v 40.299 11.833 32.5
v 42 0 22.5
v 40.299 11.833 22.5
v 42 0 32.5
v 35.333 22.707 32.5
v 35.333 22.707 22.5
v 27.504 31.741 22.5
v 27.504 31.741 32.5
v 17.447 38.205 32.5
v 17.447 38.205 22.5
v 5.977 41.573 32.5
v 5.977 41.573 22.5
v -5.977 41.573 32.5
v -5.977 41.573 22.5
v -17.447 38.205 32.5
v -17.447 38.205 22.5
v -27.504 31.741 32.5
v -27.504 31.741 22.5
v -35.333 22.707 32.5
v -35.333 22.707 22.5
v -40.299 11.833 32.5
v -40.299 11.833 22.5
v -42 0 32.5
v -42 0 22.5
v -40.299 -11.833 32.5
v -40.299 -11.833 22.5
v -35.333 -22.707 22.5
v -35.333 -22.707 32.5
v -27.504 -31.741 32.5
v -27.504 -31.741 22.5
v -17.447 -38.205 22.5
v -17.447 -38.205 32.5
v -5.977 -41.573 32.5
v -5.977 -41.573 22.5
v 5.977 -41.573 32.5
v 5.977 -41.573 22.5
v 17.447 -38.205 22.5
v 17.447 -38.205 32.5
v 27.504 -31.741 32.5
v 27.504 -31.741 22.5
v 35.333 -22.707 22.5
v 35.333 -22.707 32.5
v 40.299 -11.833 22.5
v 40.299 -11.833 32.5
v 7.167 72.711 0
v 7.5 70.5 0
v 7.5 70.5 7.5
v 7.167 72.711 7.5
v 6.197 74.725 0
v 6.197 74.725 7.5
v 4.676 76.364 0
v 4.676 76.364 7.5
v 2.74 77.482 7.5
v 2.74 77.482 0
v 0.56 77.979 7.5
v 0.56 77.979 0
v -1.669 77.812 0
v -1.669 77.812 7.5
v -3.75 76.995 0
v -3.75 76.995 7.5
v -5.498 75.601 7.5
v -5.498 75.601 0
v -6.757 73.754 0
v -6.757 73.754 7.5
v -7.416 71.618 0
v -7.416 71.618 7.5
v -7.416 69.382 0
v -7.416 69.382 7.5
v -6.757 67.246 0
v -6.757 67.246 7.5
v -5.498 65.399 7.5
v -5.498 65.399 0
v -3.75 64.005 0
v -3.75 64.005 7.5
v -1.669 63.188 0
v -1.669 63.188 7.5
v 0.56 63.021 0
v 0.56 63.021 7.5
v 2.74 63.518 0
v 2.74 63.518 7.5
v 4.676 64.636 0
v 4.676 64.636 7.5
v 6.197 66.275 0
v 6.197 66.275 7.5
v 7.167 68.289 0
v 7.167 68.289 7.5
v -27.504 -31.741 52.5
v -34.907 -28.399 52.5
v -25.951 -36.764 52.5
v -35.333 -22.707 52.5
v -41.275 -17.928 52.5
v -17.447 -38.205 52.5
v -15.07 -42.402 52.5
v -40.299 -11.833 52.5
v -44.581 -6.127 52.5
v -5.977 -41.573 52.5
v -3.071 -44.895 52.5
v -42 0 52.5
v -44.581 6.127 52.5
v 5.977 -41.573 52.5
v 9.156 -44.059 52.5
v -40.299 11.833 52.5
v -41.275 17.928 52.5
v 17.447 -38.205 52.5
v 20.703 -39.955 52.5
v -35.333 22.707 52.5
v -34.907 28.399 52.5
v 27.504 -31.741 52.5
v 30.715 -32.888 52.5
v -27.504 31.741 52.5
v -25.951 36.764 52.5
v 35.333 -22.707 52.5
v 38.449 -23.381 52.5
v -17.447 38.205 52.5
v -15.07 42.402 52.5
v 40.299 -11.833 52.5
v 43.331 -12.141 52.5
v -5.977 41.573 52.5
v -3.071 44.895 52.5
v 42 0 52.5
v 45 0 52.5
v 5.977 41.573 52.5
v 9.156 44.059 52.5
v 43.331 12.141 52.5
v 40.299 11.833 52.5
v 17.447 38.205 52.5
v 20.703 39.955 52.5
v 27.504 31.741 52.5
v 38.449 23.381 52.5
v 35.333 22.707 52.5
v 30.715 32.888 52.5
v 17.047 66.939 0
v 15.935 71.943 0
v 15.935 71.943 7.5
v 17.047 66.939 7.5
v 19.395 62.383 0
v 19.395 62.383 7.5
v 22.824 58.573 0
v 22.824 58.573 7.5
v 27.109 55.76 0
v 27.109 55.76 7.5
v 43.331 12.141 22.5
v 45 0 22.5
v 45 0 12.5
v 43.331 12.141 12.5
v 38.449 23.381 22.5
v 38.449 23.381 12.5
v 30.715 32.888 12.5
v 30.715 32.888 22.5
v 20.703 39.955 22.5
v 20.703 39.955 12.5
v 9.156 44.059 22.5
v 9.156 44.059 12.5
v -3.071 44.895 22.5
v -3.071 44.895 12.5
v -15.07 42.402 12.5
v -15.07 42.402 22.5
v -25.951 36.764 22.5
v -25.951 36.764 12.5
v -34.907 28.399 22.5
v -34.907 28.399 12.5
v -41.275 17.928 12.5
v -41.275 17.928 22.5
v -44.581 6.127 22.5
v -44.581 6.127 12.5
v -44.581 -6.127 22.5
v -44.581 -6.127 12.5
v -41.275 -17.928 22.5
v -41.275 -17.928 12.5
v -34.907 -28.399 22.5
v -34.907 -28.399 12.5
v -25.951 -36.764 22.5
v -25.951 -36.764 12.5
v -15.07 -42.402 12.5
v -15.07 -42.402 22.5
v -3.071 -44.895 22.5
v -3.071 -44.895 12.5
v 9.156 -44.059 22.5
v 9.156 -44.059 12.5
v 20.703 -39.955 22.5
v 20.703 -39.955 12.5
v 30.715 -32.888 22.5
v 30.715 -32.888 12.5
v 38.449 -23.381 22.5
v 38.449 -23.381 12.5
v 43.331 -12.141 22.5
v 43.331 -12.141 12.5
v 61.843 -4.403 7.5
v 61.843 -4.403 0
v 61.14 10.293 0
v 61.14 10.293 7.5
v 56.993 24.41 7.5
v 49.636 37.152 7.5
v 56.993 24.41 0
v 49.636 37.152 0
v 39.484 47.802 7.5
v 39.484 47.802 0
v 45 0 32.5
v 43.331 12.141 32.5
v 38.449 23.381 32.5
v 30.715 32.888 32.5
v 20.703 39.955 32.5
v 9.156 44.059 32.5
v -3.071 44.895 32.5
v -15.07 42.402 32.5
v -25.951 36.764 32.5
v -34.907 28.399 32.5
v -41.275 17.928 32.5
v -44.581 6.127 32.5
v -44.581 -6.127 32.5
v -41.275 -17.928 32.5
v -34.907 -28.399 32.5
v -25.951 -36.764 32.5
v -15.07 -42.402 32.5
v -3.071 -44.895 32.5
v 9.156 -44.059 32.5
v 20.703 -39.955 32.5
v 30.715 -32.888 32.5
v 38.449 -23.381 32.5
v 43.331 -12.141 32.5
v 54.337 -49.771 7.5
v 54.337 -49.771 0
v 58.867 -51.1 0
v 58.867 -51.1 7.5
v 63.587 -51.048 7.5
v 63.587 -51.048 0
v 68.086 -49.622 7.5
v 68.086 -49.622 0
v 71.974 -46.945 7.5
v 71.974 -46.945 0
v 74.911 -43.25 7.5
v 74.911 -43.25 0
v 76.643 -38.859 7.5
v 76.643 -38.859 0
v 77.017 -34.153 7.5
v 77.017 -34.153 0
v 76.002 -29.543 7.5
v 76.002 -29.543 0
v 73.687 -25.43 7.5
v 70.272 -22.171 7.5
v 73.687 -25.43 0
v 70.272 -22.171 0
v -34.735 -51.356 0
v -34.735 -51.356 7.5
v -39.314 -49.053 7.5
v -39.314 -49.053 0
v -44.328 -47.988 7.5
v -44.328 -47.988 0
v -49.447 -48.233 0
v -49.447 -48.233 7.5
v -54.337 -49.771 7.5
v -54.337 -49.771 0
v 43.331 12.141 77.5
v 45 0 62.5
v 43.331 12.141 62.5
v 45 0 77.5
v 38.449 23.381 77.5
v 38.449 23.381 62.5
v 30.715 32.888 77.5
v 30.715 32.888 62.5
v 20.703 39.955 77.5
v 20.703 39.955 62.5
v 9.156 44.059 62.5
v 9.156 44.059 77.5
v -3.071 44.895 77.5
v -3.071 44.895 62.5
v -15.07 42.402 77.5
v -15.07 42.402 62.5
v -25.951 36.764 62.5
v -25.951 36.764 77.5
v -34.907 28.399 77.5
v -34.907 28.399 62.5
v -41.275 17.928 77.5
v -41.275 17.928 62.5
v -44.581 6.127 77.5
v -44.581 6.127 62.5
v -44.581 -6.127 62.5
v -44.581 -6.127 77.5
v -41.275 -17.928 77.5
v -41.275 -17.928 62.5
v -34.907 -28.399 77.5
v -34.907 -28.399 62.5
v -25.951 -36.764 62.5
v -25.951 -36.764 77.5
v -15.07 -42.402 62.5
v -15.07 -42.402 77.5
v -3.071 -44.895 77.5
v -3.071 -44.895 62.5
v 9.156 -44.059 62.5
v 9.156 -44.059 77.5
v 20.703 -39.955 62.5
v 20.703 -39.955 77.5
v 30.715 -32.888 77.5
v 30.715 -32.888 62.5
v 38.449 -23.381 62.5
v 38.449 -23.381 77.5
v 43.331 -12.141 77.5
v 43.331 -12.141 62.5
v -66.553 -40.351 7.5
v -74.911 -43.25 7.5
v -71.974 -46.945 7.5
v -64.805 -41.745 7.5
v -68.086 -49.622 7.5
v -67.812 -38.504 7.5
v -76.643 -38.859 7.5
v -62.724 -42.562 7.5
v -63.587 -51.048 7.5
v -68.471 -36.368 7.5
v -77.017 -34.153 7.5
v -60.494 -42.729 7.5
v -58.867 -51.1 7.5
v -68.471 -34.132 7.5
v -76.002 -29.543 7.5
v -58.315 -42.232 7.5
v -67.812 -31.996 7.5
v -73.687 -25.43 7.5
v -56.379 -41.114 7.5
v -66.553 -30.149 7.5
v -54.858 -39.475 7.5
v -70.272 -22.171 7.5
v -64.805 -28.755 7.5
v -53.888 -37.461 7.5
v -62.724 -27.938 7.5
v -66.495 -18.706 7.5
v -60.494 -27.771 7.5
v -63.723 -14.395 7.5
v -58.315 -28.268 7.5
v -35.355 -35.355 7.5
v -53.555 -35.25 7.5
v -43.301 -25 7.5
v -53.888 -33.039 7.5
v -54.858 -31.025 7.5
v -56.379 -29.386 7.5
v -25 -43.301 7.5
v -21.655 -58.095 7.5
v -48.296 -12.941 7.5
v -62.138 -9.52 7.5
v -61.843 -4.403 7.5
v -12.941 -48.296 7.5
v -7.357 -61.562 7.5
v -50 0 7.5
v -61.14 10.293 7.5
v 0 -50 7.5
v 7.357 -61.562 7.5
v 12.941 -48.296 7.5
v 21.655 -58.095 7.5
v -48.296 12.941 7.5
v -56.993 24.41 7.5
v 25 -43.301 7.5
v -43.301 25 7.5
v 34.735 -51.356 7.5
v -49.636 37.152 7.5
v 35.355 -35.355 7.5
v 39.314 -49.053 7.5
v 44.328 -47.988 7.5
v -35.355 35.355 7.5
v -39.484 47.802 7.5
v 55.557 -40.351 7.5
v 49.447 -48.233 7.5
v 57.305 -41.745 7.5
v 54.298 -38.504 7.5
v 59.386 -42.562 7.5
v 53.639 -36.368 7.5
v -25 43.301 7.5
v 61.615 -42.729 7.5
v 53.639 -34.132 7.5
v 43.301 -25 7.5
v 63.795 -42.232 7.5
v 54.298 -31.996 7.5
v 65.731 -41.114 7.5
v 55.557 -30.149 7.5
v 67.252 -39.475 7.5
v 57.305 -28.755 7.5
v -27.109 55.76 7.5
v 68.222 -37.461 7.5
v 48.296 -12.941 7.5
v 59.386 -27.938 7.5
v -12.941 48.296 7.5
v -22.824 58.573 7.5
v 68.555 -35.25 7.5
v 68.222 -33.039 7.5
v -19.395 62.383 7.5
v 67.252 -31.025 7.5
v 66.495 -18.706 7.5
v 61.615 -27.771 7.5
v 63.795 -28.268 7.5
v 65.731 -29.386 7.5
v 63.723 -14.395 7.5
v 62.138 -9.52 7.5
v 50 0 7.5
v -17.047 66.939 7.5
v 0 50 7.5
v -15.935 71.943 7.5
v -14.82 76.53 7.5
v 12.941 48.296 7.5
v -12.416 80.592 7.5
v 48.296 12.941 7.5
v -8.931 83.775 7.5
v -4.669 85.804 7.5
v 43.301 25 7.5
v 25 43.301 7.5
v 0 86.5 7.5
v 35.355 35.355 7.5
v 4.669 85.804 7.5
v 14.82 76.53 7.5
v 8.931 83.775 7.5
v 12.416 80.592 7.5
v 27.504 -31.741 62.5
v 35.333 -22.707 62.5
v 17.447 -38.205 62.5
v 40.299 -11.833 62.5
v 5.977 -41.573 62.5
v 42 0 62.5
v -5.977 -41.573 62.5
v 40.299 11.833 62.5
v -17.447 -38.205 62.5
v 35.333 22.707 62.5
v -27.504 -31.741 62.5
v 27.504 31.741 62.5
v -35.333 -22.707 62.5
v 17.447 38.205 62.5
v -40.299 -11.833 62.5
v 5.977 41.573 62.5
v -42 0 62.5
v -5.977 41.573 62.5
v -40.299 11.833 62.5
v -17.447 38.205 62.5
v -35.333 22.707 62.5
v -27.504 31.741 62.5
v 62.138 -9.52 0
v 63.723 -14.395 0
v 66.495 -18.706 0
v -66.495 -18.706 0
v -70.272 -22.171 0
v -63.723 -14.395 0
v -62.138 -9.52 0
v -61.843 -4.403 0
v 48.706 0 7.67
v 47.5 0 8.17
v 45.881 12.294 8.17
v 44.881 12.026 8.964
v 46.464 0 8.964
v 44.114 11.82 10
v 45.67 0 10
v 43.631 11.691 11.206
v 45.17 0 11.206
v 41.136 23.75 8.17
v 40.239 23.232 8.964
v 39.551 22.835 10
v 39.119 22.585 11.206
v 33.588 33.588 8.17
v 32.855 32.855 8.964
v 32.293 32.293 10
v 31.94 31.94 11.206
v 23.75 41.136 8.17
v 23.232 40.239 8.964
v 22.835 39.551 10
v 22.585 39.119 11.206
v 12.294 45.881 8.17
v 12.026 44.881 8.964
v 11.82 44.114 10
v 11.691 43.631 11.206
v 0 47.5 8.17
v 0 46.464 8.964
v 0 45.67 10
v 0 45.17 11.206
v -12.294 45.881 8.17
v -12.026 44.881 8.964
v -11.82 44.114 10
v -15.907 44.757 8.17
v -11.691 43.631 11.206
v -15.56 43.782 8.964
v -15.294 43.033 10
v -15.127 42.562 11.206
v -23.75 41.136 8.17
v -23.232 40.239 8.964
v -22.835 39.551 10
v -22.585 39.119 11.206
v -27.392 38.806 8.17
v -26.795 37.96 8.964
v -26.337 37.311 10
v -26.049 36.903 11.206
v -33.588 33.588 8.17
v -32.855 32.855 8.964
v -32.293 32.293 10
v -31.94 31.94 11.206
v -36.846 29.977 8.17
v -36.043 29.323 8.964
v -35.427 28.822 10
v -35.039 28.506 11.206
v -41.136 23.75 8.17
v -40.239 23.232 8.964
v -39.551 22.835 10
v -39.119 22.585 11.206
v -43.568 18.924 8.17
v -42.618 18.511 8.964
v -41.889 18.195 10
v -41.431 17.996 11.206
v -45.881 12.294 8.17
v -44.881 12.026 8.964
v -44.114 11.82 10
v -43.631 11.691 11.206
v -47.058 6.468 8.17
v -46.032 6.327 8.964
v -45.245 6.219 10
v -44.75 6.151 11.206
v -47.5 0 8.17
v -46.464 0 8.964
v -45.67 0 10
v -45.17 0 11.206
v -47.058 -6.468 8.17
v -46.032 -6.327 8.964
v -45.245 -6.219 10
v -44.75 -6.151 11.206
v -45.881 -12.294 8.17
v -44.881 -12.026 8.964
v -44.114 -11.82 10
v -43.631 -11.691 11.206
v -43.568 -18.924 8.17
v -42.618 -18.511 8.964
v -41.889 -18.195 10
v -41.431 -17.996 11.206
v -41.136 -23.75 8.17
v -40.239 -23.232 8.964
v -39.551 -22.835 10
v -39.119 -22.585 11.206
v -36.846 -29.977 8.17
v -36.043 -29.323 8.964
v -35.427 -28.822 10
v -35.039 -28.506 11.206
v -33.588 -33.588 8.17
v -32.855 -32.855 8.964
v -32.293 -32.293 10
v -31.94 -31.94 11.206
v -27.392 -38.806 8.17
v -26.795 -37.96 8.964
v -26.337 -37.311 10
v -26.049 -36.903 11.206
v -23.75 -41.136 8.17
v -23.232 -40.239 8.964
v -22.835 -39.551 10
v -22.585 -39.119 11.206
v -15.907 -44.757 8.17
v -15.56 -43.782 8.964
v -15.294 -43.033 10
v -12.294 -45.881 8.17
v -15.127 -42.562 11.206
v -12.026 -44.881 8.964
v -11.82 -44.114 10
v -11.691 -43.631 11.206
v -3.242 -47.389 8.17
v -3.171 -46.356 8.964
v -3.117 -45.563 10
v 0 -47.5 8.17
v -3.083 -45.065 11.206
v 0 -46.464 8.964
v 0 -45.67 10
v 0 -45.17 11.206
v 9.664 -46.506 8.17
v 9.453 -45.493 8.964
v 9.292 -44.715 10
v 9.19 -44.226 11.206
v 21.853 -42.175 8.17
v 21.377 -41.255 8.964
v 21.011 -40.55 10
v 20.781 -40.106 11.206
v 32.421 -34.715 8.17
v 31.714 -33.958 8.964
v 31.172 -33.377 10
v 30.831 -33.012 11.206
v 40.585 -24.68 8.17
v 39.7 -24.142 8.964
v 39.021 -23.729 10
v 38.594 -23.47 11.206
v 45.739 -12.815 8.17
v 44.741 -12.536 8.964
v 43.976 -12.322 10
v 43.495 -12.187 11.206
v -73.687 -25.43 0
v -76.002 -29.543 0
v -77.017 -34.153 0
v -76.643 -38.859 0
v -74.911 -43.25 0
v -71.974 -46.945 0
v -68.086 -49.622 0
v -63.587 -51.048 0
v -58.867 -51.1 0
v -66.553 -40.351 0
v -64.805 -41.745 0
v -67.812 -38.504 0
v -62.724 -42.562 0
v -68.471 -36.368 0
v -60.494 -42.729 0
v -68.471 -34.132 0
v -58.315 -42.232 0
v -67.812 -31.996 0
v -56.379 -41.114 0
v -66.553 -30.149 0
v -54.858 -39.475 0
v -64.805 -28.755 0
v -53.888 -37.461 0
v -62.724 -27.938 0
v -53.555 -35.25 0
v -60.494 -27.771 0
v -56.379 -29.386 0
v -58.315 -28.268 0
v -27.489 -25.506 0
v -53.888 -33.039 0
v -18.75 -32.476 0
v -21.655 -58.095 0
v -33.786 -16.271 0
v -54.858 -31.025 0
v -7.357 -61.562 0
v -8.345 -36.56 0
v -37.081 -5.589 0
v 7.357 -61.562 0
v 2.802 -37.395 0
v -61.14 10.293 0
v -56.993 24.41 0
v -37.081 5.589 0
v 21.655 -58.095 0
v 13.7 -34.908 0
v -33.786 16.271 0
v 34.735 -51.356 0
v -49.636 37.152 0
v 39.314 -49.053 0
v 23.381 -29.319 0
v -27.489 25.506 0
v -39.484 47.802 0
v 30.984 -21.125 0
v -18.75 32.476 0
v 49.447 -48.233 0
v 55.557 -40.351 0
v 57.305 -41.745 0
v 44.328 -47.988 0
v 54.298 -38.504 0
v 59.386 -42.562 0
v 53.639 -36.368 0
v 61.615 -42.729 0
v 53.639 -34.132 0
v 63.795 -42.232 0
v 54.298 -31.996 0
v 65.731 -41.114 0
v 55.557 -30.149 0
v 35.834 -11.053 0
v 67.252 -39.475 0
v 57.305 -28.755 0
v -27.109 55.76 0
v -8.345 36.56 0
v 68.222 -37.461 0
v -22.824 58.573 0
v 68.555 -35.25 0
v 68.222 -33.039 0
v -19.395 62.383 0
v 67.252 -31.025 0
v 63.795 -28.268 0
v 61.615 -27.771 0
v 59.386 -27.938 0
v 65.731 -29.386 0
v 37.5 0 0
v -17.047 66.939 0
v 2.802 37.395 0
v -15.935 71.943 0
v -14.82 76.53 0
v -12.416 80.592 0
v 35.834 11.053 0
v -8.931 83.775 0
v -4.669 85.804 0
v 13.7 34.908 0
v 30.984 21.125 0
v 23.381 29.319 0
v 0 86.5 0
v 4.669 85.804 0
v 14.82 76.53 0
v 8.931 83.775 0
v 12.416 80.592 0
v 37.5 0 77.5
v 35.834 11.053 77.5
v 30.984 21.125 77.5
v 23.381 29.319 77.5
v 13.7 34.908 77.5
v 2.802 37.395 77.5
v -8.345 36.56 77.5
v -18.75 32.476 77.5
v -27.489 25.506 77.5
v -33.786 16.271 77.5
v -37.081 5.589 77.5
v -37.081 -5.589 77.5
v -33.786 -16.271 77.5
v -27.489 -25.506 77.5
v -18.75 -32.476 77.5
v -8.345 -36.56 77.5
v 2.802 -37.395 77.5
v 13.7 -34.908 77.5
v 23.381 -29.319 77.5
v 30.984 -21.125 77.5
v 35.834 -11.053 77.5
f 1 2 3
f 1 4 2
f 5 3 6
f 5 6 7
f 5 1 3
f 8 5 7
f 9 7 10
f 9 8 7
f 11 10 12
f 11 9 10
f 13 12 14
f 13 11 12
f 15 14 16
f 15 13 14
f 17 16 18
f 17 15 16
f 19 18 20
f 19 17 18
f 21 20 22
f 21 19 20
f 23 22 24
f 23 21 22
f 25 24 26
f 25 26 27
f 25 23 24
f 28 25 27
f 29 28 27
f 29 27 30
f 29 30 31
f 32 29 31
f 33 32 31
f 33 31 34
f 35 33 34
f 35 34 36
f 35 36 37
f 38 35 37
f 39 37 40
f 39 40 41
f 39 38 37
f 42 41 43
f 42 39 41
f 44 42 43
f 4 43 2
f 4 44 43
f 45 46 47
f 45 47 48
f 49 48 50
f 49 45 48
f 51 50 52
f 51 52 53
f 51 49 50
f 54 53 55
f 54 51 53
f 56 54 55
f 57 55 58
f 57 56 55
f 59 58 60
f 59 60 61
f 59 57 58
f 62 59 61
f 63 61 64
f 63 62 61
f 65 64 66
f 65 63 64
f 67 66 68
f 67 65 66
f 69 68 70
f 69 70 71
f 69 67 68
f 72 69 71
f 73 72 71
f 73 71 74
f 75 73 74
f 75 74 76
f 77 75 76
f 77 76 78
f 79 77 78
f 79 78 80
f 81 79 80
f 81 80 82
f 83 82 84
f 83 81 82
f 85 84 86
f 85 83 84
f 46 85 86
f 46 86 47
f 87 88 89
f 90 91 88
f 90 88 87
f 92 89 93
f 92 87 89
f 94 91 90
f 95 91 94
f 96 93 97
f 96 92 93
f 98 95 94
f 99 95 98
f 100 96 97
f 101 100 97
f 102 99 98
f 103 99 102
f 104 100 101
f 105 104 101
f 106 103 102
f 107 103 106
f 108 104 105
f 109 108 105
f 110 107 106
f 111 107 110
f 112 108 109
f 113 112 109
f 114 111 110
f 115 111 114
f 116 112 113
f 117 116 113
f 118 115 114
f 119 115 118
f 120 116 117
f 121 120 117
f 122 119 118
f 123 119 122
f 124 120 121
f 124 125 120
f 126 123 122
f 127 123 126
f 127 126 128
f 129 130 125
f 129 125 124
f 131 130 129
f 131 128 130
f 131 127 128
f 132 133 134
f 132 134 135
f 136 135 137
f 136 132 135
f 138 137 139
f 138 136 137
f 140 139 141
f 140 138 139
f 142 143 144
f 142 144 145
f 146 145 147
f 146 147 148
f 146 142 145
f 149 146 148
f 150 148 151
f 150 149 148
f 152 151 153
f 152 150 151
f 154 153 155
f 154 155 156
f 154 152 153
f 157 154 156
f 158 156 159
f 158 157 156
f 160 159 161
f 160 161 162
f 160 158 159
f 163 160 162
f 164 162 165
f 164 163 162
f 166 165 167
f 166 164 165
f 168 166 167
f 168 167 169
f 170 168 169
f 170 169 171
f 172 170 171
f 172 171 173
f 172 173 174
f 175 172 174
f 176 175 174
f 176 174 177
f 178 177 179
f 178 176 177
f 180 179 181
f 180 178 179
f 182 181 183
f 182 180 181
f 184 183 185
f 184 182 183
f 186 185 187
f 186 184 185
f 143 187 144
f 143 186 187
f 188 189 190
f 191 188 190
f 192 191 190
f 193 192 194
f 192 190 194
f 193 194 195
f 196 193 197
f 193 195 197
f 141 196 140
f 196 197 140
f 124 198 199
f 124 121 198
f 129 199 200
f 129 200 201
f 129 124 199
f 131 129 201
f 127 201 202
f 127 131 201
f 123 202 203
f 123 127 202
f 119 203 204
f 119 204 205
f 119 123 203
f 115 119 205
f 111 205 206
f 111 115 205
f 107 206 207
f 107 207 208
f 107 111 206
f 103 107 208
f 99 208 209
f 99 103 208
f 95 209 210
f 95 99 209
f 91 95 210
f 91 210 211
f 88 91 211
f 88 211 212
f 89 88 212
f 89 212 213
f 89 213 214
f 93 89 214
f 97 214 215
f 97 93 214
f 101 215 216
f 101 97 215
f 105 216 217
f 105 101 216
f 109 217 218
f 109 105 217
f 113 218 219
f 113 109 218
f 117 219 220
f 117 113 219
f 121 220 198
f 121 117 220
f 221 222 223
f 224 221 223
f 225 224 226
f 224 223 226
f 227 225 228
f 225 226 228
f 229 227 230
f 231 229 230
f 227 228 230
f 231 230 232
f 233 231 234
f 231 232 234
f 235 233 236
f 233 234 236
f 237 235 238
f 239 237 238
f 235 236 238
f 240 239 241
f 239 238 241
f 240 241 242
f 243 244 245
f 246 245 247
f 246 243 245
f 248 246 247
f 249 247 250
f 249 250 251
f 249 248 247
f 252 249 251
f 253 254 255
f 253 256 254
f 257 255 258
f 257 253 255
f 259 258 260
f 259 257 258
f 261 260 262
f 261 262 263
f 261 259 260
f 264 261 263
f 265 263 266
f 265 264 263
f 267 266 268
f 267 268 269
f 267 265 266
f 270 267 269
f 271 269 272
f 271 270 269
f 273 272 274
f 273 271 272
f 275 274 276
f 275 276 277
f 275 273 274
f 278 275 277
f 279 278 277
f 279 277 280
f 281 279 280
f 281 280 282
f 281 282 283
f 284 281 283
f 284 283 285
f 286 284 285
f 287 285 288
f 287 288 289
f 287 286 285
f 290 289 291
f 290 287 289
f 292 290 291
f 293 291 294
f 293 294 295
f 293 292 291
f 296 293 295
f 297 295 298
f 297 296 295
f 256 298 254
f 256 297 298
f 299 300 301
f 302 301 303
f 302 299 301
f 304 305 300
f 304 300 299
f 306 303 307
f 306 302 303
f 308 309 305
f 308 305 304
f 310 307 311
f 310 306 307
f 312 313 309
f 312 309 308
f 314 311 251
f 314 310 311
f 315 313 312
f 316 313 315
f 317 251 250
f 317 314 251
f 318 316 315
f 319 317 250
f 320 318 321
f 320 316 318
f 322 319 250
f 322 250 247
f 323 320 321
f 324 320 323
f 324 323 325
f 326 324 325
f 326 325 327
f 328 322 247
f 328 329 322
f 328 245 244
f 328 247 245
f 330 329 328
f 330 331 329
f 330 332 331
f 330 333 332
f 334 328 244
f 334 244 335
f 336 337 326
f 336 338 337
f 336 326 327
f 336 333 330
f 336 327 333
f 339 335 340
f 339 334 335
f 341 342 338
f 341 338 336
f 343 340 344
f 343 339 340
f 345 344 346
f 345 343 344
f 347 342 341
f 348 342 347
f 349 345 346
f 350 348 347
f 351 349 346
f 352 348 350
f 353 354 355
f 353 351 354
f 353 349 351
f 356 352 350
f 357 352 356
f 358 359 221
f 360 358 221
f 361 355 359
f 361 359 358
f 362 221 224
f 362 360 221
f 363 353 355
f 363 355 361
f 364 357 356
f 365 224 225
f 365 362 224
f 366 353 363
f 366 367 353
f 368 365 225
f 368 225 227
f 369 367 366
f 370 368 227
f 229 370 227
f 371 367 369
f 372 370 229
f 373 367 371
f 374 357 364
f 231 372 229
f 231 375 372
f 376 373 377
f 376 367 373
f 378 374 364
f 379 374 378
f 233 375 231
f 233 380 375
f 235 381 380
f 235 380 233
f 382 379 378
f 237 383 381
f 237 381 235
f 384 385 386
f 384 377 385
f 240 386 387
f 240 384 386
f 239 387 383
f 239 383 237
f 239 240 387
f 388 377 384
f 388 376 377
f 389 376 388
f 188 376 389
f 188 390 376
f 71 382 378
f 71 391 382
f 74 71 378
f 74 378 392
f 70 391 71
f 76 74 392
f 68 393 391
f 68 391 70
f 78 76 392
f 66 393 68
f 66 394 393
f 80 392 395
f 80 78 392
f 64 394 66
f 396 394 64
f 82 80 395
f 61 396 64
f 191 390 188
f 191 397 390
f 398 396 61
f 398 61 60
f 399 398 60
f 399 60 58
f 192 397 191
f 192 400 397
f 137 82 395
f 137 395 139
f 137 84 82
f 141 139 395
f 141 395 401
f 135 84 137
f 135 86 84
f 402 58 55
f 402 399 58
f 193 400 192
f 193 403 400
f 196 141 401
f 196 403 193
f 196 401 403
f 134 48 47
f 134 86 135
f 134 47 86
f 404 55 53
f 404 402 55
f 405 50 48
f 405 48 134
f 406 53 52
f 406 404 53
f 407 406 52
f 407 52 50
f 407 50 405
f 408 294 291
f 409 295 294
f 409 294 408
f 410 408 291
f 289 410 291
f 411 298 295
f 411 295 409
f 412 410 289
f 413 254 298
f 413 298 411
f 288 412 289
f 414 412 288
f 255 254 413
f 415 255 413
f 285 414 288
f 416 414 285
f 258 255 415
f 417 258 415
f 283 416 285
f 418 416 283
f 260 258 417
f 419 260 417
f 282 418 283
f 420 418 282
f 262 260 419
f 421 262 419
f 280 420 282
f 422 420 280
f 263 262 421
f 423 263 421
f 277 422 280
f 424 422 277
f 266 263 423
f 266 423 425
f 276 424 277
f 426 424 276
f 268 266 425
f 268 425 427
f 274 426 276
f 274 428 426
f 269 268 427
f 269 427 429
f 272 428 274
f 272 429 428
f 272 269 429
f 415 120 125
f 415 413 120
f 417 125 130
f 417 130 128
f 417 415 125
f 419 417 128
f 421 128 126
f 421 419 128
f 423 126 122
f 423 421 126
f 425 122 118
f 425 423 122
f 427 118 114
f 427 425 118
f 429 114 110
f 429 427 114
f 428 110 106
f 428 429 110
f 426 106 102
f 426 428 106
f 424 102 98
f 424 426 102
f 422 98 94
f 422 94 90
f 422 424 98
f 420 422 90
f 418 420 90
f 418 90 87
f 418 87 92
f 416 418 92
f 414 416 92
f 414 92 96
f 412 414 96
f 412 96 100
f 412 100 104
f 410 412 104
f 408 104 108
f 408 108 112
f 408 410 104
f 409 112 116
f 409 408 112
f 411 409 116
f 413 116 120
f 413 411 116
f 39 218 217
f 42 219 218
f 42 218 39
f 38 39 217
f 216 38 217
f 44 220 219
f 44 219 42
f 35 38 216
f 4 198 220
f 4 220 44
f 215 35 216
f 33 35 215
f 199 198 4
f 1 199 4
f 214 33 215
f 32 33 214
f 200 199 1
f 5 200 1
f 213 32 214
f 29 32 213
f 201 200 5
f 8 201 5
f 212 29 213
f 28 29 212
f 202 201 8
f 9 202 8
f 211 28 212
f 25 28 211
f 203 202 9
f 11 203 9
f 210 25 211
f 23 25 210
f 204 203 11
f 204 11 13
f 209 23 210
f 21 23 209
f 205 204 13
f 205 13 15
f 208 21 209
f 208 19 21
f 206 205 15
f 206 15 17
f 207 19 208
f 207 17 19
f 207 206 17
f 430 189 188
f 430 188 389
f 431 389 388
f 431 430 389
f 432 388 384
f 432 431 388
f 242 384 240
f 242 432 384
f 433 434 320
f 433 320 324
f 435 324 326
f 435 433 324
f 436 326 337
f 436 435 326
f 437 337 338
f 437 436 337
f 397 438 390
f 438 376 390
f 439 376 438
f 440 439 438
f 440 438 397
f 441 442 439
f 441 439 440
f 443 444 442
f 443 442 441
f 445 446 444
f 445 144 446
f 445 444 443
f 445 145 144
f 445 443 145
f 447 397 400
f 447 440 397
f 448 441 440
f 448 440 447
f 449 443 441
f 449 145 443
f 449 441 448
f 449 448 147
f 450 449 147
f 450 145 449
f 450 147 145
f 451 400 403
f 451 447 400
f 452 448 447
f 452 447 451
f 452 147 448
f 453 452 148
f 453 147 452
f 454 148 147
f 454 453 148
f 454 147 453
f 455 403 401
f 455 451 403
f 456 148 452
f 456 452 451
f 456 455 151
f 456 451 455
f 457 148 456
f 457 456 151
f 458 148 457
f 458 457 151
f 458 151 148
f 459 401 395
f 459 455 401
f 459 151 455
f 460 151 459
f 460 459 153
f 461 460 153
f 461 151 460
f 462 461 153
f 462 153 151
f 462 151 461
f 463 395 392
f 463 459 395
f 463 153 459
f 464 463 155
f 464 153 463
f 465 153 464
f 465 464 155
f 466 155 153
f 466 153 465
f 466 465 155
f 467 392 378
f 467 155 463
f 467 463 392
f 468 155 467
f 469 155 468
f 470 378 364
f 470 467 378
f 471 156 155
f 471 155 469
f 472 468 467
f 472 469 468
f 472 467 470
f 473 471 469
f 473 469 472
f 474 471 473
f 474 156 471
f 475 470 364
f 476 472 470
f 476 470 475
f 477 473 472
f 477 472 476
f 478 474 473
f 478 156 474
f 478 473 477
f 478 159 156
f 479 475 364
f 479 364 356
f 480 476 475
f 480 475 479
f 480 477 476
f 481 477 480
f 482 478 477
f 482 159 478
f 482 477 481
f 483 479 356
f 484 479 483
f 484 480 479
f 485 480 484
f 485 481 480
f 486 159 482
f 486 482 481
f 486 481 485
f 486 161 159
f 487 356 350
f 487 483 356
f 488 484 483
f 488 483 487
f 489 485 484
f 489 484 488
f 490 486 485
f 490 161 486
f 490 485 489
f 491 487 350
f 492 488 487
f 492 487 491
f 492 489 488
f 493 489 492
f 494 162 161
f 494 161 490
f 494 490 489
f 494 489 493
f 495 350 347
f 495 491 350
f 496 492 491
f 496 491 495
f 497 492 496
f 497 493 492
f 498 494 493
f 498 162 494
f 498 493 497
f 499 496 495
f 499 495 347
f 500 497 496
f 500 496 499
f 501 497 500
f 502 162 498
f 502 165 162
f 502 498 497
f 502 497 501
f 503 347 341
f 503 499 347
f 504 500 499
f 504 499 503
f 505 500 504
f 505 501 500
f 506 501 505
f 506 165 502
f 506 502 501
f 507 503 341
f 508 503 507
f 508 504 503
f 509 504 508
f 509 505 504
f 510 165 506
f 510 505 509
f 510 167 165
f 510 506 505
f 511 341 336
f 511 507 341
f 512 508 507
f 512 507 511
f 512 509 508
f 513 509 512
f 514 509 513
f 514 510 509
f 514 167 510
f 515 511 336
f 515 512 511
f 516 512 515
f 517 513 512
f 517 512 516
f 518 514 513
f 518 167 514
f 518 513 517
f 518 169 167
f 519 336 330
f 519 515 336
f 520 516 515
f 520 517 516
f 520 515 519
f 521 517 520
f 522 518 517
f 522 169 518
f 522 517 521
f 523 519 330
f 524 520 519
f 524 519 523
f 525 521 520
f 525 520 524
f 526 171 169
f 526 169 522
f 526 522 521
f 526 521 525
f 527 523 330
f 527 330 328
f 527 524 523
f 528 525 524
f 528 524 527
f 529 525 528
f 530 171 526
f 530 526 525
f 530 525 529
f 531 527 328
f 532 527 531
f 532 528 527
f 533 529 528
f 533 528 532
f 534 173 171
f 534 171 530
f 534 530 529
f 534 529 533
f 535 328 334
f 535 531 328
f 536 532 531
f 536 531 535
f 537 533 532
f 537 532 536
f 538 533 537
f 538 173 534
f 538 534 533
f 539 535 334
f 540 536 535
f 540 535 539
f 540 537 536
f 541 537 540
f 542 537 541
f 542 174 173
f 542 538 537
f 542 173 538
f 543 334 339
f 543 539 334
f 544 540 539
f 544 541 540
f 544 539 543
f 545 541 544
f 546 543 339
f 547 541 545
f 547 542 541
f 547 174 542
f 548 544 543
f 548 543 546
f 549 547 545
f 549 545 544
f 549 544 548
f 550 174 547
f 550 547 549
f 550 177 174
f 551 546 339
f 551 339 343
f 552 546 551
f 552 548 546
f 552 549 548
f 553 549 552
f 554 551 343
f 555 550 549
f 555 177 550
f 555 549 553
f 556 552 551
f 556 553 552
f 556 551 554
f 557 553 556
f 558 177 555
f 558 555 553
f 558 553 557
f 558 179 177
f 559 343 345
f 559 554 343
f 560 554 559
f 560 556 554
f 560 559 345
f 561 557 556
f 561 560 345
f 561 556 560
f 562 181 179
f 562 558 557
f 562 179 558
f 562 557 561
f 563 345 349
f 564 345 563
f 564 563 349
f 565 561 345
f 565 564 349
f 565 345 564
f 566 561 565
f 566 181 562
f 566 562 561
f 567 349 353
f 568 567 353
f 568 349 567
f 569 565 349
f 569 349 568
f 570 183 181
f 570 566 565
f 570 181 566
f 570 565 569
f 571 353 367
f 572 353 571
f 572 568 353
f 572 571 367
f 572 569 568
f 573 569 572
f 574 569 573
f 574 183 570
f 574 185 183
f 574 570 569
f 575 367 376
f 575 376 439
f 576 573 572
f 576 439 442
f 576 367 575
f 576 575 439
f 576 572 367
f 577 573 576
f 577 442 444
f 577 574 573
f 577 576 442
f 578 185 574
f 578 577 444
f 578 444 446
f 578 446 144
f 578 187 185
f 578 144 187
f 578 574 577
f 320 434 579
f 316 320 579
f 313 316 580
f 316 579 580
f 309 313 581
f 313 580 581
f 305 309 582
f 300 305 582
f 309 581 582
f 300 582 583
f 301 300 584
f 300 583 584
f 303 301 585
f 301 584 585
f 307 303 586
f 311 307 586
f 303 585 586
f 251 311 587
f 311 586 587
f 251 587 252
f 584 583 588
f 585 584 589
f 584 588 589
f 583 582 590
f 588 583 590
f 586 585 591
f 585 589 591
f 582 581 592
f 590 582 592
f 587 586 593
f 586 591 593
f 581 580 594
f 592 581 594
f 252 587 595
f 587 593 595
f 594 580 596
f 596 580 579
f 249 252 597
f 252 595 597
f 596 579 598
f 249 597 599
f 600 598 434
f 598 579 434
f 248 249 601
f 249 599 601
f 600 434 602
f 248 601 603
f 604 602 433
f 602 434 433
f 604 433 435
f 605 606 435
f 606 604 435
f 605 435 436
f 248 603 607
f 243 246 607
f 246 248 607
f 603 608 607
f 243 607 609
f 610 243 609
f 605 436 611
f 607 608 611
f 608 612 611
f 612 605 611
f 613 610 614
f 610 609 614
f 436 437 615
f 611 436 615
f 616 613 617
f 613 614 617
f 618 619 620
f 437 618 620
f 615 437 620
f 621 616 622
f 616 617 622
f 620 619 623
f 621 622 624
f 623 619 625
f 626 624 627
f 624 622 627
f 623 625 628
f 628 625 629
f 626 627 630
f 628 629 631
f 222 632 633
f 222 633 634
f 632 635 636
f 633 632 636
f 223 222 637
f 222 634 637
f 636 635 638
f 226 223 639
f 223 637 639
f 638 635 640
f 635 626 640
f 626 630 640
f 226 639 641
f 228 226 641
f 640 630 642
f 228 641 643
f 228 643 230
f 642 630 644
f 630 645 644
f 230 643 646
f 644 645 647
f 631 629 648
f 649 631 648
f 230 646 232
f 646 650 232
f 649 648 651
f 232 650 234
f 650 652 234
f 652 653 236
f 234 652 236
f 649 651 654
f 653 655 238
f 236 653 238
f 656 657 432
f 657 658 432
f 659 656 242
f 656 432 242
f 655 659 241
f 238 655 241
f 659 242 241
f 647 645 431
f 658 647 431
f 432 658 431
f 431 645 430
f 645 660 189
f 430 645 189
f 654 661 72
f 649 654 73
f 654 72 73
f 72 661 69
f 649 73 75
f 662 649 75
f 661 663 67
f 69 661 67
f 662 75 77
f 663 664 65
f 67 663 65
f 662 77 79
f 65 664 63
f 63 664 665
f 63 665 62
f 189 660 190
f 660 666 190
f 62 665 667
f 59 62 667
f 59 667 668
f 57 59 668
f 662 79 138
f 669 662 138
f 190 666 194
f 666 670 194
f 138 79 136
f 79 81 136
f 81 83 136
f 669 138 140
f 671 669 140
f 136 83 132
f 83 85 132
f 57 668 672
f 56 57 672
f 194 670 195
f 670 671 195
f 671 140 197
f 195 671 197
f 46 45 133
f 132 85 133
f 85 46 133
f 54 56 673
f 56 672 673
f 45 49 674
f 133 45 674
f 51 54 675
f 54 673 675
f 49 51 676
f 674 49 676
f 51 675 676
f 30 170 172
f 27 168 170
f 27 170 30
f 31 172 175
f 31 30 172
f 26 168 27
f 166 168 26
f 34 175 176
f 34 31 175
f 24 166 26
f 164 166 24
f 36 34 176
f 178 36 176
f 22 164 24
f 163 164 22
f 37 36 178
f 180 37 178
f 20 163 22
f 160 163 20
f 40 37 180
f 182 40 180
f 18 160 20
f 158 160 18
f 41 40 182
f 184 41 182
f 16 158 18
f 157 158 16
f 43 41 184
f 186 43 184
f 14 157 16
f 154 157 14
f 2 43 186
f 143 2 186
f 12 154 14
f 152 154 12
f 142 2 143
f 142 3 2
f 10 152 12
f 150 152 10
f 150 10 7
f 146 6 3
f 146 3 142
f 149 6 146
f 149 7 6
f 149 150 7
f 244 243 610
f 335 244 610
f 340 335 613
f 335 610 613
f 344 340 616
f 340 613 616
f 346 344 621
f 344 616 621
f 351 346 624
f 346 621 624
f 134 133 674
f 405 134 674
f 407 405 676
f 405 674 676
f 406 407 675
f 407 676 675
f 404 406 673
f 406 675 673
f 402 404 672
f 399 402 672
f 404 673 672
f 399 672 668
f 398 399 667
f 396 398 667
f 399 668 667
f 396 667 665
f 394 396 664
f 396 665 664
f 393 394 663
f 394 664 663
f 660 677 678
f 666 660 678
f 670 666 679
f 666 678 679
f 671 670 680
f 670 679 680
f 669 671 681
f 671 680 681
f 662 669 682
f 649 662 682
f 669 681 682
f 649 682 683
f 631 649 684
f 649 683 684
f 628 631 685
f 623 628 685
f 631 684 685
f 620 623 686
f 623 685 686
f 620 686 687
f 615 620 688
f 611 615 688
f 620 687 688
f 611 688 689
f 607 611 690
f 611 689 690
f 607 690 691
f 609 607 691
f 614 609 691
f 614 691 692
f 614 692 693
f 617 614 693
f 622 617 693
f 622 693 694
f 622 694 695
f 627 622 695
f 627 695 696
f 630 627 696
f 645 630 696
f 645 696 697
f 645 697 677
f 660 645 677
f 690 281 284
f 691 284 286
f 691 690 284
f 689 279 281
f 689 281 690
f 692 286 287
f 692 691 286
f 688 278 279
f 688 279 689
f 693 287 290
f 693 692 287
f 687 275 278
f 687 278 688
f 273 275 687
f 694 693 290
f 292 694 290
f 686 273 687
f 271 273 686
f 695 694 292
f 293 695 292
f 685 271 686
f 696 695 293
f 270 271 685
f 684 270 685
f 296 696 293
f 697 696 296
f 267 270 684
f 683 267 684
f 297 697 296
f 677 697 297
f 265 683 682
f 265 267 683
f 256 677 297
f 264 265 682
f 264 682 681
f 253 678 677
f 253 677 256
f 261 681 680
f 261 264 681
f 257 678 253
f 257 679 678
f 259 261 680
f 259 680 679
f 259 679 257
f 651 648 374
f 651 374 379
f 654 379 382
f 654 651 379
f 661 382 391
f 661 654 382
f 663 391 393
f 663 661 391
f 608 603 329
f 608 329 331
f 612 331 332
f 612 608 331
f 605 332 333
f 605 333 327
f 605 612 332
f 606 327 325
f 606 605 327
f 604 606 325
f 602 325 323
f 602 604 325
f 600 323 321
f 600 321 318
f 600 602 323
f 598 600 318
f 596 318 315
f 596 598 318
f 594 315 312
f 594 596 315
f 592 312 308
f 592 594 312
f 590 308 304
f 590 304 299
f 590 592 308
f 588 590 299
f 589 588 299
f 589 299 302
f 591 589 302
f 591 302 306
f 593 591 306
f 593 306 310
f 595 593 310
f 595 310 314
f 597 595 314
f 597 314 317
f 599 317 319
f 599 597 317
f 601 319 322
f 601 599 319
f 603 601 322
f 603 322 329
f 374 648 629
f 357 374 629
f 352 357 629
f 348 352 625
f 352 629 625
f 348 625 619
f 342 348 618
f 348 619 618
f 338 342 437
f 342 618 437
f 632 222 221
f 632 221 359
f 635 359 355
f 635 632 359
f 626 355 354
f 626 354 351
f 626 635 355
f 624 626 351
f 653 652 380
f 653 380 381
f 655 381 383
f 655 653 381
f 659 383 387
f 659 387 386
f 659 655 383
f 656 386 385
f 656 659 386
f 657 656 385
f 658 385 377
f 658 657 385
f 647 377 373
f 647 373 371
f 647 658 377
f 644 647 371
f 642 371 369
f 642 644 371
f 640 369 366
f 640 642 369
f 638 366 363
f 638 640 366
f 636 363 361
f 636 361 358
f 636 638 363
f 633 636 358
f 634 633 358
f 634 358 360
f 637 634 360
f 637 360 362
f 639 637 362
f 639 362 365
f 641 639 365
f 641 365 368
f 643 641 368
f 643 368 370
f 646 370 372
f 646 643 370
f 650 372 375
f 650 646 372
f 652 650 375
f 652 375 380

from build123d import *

# Parameters (mm, degrees)
SKETCH_R     = 7.5
PAD_DEPTH    = 7.5
FILLET_R     = 5
SKETCH002_R  = 37.5
POCKET_DEPTH = 77.501


with BuildPart() as part:
    # Sketch → Pad (new body)
    with BuildSketch(Plane.XY):
        with BuildLine():
            ThreePointArc((-27.108608, 55.759514), (-53.693575, 31), (-61.843459, -4.403014))
            ThreePointArc((-70.271756, -22.171485), (-63.722793, -14.394746), (-61.843459, -4.403014))
            ThreePointArc((-70.271756, -22.171485), (-74.911197, -43.25), (-54.336947, -49.771383))
            ThreePointArc((-34.734852, -51.3565), (-44.327612, -47.988185), (-54.336947, -49.771383))
            ThreePointArc((-34.734852, -51.3565), (0, -62), (34.734852, -51.3565))
            ThreePointArc((54.336947, -49.771383), (44.327612, -47.988185), (34.734852, -51.3565))
            ThreePointArc((54.336947, -49.771383), (74.911197, -43.25), (70.271756, -22.171485))
            ThreePointArc((61.843459, -4.403014), (63.722793, -14.394746), (70.271756, -22.171485))
            ThreePointArc((61.843459, -4.403014), (53.693575, 31), (27.108608, 55.759514))
            ThreePointArc((15.934809, 71.942868), (19.395181, 62.38293), (27.108608, 55.759514))
            ThreePointArc((15.934809, 71.942868), (0, 86.5), (-15.934809, 71.942868))
            ThreePointArc((-27.108608, 55.759514), (-19.395181, 62.38293), (-15.934809, 71.942868))
        make_face()
        with Locations((0, 70.5)):
            Circle(SKETCH_R, mode=Mode.SUBTRACT)
        with Locations((-61.054791, -35.25)):
            Circle(SKETCH_R, mode=Mode.SUBTRACT)
        with Locations((61.054791, -35.25)):
            Circle(SKETCH_R, mode=Mode.SUBTRACT)
    extrude(amount=PAD_DEPTH)

    # Sketch001 → Revolution (revolve)
    with BuildSketch(Plane.XZ):
        Polygon((0, 7.5), (45, 7.5), (45, 22.5), (42, 22.5), (42, 32.5), (45, 32.5), (45, 52.5), (42, 52.5), (42, 62.5), (45, 62.5), (45, 77.5), (0, 77.5), align=None)
    revolve(axis=Axis((0, 0, 0), (0, 0, 1)))

    # Fillet
    fillet_edges = [part.edges().sort_by_distance(p)[0] for p in [
        (-45, 0, 7.5),
    ]]
    fillet(fillet_edges, radius=FILLET_R)

    # Sketch002 (on Face28 of Fillet) → Pocket (cut, through all)
    with BuildSketch(Plane.XY.offset(77.5)):
        Circle(SKETCH002_R)
    extrude(amount=-POCKET_DEPTH, mode=Mode.SUBTRACT)


solid = part.part
